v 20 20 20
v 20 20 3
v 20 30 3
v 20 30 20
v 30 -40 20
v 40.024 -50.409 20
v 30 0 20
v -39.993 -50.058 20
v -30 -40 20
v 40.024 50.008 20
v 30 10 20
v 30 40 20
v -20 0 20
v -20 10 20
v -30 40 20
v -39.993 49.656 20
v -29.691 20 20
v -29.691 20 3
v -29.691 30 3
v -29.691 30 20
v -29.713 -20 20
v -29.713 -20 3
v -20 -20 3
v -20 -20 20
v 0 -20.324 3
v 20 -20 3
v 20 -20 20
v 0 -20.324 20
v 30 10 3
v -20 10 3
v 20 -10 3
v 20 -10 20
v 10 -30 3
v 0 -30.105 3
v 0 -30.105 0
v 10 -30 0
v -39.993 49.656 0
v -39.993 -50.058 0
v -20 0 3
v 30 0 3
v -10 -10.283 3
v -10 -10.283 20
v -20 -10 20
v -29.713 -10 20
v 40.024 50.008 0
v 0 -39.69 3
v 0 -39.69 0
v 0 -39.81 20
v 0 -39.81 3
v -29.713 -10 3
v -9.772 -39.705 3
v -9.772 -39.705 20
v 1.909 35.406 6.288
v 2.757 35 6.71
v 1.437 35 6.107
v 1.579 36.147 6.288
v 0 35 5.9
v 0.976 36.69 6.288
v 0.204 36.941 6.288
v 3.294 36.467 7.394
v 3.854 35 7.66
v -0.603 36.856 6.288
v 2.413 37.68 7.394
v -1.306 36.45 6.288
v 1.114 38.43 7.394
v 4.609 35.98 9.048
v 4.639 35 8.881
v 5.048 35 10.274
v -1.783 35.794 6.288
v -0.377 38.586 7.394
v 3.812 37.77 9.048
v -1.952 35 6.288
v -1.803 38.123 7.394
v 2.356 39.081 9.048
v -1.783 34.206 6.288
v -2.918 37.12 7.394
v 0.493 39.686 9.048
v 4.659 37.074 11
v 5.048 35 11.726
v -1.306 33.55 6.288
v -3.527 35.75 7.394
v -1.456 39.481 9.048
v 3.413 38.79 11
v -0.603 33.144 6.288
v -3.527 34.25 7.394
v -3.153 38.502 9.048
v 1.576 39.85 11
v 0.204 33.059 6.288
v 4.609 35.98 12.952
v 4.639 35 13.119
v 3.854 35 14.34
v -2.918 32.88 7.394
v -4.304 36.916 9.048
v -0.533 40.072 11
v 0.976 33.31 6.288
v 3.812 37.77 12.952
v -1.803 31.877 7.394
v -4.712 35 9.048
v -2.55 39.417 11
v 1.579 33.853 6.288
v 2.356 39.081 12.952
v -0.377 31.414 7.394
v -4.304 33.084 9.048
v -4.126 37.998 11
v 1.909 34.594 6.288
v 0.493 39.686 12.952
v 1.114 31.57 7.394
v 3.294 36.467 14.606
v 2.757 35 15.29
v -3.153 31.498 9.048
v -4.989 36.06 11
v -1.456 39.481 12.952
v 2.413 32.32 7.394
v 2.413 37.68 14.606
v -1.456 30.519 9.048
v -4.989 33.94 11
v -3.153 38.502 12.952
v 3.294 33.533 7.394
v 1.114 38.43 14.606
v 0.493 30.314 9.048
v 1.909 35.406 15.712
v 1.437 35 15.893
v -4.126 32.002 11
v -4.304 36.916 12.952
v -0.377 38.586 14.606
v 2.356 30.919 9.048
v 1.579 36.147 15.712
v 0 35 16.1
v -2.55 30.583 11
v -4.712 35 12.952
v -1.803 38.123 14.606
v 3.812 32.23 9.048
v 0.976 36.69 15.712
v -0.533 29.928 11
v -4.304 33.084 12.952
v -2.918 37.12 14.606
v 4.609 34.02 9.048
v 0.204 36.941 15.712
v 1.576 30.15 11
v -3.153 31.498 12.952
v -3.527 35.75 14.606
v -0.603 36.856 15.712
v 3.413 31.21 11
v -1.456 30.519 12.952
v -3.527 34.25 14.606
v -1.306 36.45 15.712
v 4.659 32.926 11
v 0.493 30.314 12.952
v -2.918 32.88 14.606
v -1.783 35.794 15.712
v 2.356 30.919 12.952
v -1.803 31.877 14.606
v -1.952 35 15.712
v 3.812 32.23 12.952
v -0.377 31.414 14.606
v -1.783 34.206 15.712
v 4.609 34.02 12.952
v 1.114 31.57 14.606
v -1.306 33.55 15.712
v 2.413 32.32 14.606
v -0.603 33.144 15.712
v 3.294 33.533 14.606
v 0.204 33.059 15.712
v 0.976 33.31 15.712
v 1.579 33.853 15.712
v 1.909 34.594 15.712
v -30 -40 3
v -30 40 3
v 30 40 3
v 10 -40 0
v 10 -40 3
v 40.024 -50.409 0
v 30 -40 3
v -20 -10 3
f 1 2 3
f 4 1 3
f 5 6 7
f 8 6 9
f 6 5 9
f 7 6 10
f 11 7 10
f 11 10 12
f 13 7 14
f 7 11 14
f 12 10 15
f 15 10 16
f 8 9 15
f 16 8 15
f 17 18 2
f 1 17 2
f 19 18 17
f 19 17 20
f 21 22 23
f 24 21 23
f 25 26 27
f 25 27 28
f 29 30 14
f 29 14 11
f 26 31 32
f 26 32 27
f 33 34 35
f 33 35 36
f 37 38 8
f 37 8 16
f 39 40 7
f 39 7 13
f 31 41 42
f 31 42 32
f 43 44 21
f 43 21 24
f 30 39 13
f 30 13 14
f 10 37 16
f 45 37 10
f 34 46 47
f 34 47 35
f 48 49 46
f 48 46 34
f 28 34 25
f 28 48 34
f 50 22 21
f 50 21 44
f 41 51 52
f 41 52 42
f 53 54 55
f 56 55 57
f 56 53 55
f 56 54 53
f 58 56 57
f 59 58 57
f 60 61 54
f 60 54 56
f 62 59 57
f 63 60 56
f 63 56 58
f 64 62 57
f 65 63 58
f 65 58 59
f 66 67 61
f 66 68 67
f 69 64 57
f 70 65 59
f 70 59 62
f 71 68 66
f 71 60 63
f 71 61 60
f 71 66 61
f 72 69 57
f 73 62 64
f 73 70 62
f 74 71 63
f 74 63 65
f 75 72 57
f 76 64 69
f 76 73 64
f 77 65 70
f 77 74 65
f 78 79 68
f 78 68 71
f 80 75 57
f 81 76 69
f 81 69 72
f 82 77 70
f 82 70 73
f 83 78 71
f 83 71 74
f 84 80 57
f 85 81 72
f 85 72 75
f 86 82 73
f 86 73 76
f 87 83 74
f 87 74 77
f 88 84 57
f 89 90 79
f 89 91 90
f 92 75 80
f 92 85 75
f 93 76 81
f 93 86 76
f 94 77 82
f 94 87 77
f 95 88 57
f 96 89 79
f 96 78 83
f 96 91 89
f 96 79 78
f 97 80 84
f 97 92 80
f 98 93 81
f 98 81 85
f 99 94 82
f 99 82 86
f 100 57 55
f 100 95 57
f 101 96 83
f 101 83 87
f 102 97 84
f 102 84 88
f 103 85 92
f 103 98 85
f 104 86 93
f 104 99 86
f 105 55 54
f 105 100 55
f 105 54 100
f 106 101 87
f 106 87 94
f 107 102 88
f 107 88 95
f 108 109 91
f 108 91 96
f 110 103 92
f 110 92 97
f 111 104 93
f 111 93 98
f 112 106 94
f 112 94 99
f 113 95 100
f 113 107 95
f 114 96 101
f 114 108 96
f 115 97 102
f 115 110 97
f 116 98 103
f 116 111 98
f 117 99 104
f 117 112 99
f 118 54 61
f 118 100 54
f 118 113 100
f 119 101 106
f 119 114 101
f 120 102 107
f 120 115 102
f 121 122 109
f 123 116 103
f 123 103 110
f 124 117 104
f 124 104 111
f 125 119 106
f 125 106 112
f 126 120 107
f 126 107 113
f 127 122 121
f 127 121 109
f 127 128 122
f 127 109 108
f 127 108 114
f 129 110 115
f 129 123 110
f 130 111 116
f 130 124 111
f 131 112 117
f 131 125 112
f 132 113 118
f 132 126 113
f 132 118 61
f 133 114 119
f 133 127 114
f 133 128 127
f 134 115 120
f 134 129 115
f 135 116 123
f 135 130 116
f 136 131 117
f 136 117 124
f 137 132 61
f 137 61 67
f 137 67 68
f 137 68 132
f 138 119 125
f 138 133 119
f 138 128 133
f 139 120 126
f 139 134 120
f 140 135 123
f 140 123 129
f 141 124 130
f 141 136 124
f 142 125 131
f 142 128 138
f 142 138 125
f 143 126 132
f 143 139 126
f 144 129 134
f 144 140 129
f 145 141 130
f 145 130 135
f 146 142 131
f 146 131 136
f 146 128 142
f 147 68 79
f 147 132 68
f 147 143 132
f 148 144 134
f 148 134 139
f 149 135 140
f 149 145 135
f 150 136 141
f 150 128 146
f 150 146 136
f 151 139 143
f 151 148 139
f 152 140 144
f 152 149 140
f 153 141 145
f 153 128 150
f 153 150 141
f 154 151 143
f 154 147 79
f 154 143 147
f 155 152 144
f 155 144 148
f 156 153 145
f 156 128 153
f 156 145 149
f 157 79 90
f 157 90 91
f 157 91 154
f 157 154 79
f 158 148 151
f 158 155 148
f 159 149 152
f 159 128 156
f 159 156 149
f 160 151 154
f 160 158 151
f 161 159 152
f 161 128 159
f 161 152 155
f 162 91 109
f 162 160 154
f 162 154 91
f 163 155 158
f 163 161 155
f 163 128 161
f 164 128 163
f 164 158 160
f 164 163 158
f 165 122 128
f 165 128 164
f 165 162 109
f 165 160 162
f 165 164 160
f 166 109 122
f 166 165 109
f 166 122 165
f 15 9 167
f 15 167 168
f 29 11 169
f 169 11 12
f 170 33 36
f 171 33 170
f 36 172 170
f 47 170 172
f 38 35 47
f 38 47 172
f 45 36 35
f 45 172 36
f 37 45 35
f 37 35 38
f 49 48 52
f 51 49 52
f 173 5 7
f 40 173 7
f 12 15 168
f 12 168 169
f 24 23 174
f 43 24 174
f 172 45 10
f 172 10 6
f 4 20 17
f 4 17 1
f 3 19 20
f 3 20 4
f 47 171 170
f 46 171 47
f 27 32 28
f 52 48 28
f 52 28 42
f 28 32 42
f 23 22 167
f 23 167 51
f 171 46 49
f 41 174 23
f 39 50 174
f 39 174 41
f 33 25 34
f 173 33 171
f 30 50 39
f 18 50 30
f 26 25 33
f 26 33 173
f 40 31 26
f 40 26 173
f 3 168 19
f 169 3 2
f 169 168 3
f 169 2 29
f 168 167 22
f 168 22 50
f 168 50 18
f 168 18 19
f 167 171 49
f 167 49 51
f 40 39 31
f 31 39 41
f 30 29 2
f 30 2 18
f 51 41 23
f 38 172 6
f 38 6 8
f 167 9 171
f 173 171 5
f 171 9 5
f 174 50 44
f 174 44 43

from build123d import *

# Parameters (mm, degrees)
PAD_DEPTH       = 20
SKETCH001_W     = 60
SKETCH001_H     = 80
POCKET_DEPTH    = 17
SKETCH002_W     = 49.691427
SKETCH002_H     = 10
SKETCH002_W_2   = 9.712863
PAD001_DEPTH    = 17
POCKET001_DEPTH = 5


with BuildPart() as body:
    # Sketch → Pad (new body)
    with BuildSketch(Plane.XY):
        Polygon((-39.993084, 49.65583), (40.023857, 50.007553), (40.023857, -50.409309), (-39.993084, -50.057587), align=None)
    extrude(amount=PAD_DEPTH)

    # Sketch001 (on Face6 of Pad) → Pocket (cut)
    with BuildSketch(Plane.XY.offset(20)):
        Rectangle(SKETCH001_W, SKETCH001_H)
    extrude(amount=-POCKET_DEPTH, mode=Mode.SUBTRACT)

    # Sketch002 (on Face11 of Pocket) → Pad001 (join)
    with BuildSketch(Plane.XY.offset(3)):
        with Locations((-4.845713, 25)):
            Rectangle(SKETCH002_W, SKETCH002_H)
        Polygon((30.235863, 0), (-20, 0), (-20, 10), (30, 10), align=None)
        with Locations((-24.856431, -15)):
            Rectangle(SKETCH002_W_2, SKETCH002_H)
        Polygon((-9.77195, -39.705251), (-10, -10.283183), (20, -10), (20, -20), (0, -20.32401), (0, -39.80989), align=None)
    extrude(amount=PAD001_DEPTH)

    # Sketch003 (on Face13 of Pad001) → Pocket001 (cut)
    with BuildSketch(Plane.XY.offset(3)):
        Polygon((0, -30.104781), (10, -30), (10, -40), (0, -39.690252), align=None)
    extrude(amount=-POCKET001_DEPTH, mode=Mode.SUBTRACT)


with BuildPart() as sphere:
    # Sphere → Sphere (revolve)
    with BuildSketch(Plane(origin=(0, 35, 11), x_dir=(1, 0, 0), z_dir=(0, -1, 0))):
        with BuildLine():
            ThreePointArc((0, -5.1), (5.1, 0), (0, 5.1))
            Line((0, 5.1), (0, -5.1))
        make_face()
    revolve(axis=Axis((0, 35, 11), (0, 0, 1)))


solid = Compound([body.part, sphere.part])
